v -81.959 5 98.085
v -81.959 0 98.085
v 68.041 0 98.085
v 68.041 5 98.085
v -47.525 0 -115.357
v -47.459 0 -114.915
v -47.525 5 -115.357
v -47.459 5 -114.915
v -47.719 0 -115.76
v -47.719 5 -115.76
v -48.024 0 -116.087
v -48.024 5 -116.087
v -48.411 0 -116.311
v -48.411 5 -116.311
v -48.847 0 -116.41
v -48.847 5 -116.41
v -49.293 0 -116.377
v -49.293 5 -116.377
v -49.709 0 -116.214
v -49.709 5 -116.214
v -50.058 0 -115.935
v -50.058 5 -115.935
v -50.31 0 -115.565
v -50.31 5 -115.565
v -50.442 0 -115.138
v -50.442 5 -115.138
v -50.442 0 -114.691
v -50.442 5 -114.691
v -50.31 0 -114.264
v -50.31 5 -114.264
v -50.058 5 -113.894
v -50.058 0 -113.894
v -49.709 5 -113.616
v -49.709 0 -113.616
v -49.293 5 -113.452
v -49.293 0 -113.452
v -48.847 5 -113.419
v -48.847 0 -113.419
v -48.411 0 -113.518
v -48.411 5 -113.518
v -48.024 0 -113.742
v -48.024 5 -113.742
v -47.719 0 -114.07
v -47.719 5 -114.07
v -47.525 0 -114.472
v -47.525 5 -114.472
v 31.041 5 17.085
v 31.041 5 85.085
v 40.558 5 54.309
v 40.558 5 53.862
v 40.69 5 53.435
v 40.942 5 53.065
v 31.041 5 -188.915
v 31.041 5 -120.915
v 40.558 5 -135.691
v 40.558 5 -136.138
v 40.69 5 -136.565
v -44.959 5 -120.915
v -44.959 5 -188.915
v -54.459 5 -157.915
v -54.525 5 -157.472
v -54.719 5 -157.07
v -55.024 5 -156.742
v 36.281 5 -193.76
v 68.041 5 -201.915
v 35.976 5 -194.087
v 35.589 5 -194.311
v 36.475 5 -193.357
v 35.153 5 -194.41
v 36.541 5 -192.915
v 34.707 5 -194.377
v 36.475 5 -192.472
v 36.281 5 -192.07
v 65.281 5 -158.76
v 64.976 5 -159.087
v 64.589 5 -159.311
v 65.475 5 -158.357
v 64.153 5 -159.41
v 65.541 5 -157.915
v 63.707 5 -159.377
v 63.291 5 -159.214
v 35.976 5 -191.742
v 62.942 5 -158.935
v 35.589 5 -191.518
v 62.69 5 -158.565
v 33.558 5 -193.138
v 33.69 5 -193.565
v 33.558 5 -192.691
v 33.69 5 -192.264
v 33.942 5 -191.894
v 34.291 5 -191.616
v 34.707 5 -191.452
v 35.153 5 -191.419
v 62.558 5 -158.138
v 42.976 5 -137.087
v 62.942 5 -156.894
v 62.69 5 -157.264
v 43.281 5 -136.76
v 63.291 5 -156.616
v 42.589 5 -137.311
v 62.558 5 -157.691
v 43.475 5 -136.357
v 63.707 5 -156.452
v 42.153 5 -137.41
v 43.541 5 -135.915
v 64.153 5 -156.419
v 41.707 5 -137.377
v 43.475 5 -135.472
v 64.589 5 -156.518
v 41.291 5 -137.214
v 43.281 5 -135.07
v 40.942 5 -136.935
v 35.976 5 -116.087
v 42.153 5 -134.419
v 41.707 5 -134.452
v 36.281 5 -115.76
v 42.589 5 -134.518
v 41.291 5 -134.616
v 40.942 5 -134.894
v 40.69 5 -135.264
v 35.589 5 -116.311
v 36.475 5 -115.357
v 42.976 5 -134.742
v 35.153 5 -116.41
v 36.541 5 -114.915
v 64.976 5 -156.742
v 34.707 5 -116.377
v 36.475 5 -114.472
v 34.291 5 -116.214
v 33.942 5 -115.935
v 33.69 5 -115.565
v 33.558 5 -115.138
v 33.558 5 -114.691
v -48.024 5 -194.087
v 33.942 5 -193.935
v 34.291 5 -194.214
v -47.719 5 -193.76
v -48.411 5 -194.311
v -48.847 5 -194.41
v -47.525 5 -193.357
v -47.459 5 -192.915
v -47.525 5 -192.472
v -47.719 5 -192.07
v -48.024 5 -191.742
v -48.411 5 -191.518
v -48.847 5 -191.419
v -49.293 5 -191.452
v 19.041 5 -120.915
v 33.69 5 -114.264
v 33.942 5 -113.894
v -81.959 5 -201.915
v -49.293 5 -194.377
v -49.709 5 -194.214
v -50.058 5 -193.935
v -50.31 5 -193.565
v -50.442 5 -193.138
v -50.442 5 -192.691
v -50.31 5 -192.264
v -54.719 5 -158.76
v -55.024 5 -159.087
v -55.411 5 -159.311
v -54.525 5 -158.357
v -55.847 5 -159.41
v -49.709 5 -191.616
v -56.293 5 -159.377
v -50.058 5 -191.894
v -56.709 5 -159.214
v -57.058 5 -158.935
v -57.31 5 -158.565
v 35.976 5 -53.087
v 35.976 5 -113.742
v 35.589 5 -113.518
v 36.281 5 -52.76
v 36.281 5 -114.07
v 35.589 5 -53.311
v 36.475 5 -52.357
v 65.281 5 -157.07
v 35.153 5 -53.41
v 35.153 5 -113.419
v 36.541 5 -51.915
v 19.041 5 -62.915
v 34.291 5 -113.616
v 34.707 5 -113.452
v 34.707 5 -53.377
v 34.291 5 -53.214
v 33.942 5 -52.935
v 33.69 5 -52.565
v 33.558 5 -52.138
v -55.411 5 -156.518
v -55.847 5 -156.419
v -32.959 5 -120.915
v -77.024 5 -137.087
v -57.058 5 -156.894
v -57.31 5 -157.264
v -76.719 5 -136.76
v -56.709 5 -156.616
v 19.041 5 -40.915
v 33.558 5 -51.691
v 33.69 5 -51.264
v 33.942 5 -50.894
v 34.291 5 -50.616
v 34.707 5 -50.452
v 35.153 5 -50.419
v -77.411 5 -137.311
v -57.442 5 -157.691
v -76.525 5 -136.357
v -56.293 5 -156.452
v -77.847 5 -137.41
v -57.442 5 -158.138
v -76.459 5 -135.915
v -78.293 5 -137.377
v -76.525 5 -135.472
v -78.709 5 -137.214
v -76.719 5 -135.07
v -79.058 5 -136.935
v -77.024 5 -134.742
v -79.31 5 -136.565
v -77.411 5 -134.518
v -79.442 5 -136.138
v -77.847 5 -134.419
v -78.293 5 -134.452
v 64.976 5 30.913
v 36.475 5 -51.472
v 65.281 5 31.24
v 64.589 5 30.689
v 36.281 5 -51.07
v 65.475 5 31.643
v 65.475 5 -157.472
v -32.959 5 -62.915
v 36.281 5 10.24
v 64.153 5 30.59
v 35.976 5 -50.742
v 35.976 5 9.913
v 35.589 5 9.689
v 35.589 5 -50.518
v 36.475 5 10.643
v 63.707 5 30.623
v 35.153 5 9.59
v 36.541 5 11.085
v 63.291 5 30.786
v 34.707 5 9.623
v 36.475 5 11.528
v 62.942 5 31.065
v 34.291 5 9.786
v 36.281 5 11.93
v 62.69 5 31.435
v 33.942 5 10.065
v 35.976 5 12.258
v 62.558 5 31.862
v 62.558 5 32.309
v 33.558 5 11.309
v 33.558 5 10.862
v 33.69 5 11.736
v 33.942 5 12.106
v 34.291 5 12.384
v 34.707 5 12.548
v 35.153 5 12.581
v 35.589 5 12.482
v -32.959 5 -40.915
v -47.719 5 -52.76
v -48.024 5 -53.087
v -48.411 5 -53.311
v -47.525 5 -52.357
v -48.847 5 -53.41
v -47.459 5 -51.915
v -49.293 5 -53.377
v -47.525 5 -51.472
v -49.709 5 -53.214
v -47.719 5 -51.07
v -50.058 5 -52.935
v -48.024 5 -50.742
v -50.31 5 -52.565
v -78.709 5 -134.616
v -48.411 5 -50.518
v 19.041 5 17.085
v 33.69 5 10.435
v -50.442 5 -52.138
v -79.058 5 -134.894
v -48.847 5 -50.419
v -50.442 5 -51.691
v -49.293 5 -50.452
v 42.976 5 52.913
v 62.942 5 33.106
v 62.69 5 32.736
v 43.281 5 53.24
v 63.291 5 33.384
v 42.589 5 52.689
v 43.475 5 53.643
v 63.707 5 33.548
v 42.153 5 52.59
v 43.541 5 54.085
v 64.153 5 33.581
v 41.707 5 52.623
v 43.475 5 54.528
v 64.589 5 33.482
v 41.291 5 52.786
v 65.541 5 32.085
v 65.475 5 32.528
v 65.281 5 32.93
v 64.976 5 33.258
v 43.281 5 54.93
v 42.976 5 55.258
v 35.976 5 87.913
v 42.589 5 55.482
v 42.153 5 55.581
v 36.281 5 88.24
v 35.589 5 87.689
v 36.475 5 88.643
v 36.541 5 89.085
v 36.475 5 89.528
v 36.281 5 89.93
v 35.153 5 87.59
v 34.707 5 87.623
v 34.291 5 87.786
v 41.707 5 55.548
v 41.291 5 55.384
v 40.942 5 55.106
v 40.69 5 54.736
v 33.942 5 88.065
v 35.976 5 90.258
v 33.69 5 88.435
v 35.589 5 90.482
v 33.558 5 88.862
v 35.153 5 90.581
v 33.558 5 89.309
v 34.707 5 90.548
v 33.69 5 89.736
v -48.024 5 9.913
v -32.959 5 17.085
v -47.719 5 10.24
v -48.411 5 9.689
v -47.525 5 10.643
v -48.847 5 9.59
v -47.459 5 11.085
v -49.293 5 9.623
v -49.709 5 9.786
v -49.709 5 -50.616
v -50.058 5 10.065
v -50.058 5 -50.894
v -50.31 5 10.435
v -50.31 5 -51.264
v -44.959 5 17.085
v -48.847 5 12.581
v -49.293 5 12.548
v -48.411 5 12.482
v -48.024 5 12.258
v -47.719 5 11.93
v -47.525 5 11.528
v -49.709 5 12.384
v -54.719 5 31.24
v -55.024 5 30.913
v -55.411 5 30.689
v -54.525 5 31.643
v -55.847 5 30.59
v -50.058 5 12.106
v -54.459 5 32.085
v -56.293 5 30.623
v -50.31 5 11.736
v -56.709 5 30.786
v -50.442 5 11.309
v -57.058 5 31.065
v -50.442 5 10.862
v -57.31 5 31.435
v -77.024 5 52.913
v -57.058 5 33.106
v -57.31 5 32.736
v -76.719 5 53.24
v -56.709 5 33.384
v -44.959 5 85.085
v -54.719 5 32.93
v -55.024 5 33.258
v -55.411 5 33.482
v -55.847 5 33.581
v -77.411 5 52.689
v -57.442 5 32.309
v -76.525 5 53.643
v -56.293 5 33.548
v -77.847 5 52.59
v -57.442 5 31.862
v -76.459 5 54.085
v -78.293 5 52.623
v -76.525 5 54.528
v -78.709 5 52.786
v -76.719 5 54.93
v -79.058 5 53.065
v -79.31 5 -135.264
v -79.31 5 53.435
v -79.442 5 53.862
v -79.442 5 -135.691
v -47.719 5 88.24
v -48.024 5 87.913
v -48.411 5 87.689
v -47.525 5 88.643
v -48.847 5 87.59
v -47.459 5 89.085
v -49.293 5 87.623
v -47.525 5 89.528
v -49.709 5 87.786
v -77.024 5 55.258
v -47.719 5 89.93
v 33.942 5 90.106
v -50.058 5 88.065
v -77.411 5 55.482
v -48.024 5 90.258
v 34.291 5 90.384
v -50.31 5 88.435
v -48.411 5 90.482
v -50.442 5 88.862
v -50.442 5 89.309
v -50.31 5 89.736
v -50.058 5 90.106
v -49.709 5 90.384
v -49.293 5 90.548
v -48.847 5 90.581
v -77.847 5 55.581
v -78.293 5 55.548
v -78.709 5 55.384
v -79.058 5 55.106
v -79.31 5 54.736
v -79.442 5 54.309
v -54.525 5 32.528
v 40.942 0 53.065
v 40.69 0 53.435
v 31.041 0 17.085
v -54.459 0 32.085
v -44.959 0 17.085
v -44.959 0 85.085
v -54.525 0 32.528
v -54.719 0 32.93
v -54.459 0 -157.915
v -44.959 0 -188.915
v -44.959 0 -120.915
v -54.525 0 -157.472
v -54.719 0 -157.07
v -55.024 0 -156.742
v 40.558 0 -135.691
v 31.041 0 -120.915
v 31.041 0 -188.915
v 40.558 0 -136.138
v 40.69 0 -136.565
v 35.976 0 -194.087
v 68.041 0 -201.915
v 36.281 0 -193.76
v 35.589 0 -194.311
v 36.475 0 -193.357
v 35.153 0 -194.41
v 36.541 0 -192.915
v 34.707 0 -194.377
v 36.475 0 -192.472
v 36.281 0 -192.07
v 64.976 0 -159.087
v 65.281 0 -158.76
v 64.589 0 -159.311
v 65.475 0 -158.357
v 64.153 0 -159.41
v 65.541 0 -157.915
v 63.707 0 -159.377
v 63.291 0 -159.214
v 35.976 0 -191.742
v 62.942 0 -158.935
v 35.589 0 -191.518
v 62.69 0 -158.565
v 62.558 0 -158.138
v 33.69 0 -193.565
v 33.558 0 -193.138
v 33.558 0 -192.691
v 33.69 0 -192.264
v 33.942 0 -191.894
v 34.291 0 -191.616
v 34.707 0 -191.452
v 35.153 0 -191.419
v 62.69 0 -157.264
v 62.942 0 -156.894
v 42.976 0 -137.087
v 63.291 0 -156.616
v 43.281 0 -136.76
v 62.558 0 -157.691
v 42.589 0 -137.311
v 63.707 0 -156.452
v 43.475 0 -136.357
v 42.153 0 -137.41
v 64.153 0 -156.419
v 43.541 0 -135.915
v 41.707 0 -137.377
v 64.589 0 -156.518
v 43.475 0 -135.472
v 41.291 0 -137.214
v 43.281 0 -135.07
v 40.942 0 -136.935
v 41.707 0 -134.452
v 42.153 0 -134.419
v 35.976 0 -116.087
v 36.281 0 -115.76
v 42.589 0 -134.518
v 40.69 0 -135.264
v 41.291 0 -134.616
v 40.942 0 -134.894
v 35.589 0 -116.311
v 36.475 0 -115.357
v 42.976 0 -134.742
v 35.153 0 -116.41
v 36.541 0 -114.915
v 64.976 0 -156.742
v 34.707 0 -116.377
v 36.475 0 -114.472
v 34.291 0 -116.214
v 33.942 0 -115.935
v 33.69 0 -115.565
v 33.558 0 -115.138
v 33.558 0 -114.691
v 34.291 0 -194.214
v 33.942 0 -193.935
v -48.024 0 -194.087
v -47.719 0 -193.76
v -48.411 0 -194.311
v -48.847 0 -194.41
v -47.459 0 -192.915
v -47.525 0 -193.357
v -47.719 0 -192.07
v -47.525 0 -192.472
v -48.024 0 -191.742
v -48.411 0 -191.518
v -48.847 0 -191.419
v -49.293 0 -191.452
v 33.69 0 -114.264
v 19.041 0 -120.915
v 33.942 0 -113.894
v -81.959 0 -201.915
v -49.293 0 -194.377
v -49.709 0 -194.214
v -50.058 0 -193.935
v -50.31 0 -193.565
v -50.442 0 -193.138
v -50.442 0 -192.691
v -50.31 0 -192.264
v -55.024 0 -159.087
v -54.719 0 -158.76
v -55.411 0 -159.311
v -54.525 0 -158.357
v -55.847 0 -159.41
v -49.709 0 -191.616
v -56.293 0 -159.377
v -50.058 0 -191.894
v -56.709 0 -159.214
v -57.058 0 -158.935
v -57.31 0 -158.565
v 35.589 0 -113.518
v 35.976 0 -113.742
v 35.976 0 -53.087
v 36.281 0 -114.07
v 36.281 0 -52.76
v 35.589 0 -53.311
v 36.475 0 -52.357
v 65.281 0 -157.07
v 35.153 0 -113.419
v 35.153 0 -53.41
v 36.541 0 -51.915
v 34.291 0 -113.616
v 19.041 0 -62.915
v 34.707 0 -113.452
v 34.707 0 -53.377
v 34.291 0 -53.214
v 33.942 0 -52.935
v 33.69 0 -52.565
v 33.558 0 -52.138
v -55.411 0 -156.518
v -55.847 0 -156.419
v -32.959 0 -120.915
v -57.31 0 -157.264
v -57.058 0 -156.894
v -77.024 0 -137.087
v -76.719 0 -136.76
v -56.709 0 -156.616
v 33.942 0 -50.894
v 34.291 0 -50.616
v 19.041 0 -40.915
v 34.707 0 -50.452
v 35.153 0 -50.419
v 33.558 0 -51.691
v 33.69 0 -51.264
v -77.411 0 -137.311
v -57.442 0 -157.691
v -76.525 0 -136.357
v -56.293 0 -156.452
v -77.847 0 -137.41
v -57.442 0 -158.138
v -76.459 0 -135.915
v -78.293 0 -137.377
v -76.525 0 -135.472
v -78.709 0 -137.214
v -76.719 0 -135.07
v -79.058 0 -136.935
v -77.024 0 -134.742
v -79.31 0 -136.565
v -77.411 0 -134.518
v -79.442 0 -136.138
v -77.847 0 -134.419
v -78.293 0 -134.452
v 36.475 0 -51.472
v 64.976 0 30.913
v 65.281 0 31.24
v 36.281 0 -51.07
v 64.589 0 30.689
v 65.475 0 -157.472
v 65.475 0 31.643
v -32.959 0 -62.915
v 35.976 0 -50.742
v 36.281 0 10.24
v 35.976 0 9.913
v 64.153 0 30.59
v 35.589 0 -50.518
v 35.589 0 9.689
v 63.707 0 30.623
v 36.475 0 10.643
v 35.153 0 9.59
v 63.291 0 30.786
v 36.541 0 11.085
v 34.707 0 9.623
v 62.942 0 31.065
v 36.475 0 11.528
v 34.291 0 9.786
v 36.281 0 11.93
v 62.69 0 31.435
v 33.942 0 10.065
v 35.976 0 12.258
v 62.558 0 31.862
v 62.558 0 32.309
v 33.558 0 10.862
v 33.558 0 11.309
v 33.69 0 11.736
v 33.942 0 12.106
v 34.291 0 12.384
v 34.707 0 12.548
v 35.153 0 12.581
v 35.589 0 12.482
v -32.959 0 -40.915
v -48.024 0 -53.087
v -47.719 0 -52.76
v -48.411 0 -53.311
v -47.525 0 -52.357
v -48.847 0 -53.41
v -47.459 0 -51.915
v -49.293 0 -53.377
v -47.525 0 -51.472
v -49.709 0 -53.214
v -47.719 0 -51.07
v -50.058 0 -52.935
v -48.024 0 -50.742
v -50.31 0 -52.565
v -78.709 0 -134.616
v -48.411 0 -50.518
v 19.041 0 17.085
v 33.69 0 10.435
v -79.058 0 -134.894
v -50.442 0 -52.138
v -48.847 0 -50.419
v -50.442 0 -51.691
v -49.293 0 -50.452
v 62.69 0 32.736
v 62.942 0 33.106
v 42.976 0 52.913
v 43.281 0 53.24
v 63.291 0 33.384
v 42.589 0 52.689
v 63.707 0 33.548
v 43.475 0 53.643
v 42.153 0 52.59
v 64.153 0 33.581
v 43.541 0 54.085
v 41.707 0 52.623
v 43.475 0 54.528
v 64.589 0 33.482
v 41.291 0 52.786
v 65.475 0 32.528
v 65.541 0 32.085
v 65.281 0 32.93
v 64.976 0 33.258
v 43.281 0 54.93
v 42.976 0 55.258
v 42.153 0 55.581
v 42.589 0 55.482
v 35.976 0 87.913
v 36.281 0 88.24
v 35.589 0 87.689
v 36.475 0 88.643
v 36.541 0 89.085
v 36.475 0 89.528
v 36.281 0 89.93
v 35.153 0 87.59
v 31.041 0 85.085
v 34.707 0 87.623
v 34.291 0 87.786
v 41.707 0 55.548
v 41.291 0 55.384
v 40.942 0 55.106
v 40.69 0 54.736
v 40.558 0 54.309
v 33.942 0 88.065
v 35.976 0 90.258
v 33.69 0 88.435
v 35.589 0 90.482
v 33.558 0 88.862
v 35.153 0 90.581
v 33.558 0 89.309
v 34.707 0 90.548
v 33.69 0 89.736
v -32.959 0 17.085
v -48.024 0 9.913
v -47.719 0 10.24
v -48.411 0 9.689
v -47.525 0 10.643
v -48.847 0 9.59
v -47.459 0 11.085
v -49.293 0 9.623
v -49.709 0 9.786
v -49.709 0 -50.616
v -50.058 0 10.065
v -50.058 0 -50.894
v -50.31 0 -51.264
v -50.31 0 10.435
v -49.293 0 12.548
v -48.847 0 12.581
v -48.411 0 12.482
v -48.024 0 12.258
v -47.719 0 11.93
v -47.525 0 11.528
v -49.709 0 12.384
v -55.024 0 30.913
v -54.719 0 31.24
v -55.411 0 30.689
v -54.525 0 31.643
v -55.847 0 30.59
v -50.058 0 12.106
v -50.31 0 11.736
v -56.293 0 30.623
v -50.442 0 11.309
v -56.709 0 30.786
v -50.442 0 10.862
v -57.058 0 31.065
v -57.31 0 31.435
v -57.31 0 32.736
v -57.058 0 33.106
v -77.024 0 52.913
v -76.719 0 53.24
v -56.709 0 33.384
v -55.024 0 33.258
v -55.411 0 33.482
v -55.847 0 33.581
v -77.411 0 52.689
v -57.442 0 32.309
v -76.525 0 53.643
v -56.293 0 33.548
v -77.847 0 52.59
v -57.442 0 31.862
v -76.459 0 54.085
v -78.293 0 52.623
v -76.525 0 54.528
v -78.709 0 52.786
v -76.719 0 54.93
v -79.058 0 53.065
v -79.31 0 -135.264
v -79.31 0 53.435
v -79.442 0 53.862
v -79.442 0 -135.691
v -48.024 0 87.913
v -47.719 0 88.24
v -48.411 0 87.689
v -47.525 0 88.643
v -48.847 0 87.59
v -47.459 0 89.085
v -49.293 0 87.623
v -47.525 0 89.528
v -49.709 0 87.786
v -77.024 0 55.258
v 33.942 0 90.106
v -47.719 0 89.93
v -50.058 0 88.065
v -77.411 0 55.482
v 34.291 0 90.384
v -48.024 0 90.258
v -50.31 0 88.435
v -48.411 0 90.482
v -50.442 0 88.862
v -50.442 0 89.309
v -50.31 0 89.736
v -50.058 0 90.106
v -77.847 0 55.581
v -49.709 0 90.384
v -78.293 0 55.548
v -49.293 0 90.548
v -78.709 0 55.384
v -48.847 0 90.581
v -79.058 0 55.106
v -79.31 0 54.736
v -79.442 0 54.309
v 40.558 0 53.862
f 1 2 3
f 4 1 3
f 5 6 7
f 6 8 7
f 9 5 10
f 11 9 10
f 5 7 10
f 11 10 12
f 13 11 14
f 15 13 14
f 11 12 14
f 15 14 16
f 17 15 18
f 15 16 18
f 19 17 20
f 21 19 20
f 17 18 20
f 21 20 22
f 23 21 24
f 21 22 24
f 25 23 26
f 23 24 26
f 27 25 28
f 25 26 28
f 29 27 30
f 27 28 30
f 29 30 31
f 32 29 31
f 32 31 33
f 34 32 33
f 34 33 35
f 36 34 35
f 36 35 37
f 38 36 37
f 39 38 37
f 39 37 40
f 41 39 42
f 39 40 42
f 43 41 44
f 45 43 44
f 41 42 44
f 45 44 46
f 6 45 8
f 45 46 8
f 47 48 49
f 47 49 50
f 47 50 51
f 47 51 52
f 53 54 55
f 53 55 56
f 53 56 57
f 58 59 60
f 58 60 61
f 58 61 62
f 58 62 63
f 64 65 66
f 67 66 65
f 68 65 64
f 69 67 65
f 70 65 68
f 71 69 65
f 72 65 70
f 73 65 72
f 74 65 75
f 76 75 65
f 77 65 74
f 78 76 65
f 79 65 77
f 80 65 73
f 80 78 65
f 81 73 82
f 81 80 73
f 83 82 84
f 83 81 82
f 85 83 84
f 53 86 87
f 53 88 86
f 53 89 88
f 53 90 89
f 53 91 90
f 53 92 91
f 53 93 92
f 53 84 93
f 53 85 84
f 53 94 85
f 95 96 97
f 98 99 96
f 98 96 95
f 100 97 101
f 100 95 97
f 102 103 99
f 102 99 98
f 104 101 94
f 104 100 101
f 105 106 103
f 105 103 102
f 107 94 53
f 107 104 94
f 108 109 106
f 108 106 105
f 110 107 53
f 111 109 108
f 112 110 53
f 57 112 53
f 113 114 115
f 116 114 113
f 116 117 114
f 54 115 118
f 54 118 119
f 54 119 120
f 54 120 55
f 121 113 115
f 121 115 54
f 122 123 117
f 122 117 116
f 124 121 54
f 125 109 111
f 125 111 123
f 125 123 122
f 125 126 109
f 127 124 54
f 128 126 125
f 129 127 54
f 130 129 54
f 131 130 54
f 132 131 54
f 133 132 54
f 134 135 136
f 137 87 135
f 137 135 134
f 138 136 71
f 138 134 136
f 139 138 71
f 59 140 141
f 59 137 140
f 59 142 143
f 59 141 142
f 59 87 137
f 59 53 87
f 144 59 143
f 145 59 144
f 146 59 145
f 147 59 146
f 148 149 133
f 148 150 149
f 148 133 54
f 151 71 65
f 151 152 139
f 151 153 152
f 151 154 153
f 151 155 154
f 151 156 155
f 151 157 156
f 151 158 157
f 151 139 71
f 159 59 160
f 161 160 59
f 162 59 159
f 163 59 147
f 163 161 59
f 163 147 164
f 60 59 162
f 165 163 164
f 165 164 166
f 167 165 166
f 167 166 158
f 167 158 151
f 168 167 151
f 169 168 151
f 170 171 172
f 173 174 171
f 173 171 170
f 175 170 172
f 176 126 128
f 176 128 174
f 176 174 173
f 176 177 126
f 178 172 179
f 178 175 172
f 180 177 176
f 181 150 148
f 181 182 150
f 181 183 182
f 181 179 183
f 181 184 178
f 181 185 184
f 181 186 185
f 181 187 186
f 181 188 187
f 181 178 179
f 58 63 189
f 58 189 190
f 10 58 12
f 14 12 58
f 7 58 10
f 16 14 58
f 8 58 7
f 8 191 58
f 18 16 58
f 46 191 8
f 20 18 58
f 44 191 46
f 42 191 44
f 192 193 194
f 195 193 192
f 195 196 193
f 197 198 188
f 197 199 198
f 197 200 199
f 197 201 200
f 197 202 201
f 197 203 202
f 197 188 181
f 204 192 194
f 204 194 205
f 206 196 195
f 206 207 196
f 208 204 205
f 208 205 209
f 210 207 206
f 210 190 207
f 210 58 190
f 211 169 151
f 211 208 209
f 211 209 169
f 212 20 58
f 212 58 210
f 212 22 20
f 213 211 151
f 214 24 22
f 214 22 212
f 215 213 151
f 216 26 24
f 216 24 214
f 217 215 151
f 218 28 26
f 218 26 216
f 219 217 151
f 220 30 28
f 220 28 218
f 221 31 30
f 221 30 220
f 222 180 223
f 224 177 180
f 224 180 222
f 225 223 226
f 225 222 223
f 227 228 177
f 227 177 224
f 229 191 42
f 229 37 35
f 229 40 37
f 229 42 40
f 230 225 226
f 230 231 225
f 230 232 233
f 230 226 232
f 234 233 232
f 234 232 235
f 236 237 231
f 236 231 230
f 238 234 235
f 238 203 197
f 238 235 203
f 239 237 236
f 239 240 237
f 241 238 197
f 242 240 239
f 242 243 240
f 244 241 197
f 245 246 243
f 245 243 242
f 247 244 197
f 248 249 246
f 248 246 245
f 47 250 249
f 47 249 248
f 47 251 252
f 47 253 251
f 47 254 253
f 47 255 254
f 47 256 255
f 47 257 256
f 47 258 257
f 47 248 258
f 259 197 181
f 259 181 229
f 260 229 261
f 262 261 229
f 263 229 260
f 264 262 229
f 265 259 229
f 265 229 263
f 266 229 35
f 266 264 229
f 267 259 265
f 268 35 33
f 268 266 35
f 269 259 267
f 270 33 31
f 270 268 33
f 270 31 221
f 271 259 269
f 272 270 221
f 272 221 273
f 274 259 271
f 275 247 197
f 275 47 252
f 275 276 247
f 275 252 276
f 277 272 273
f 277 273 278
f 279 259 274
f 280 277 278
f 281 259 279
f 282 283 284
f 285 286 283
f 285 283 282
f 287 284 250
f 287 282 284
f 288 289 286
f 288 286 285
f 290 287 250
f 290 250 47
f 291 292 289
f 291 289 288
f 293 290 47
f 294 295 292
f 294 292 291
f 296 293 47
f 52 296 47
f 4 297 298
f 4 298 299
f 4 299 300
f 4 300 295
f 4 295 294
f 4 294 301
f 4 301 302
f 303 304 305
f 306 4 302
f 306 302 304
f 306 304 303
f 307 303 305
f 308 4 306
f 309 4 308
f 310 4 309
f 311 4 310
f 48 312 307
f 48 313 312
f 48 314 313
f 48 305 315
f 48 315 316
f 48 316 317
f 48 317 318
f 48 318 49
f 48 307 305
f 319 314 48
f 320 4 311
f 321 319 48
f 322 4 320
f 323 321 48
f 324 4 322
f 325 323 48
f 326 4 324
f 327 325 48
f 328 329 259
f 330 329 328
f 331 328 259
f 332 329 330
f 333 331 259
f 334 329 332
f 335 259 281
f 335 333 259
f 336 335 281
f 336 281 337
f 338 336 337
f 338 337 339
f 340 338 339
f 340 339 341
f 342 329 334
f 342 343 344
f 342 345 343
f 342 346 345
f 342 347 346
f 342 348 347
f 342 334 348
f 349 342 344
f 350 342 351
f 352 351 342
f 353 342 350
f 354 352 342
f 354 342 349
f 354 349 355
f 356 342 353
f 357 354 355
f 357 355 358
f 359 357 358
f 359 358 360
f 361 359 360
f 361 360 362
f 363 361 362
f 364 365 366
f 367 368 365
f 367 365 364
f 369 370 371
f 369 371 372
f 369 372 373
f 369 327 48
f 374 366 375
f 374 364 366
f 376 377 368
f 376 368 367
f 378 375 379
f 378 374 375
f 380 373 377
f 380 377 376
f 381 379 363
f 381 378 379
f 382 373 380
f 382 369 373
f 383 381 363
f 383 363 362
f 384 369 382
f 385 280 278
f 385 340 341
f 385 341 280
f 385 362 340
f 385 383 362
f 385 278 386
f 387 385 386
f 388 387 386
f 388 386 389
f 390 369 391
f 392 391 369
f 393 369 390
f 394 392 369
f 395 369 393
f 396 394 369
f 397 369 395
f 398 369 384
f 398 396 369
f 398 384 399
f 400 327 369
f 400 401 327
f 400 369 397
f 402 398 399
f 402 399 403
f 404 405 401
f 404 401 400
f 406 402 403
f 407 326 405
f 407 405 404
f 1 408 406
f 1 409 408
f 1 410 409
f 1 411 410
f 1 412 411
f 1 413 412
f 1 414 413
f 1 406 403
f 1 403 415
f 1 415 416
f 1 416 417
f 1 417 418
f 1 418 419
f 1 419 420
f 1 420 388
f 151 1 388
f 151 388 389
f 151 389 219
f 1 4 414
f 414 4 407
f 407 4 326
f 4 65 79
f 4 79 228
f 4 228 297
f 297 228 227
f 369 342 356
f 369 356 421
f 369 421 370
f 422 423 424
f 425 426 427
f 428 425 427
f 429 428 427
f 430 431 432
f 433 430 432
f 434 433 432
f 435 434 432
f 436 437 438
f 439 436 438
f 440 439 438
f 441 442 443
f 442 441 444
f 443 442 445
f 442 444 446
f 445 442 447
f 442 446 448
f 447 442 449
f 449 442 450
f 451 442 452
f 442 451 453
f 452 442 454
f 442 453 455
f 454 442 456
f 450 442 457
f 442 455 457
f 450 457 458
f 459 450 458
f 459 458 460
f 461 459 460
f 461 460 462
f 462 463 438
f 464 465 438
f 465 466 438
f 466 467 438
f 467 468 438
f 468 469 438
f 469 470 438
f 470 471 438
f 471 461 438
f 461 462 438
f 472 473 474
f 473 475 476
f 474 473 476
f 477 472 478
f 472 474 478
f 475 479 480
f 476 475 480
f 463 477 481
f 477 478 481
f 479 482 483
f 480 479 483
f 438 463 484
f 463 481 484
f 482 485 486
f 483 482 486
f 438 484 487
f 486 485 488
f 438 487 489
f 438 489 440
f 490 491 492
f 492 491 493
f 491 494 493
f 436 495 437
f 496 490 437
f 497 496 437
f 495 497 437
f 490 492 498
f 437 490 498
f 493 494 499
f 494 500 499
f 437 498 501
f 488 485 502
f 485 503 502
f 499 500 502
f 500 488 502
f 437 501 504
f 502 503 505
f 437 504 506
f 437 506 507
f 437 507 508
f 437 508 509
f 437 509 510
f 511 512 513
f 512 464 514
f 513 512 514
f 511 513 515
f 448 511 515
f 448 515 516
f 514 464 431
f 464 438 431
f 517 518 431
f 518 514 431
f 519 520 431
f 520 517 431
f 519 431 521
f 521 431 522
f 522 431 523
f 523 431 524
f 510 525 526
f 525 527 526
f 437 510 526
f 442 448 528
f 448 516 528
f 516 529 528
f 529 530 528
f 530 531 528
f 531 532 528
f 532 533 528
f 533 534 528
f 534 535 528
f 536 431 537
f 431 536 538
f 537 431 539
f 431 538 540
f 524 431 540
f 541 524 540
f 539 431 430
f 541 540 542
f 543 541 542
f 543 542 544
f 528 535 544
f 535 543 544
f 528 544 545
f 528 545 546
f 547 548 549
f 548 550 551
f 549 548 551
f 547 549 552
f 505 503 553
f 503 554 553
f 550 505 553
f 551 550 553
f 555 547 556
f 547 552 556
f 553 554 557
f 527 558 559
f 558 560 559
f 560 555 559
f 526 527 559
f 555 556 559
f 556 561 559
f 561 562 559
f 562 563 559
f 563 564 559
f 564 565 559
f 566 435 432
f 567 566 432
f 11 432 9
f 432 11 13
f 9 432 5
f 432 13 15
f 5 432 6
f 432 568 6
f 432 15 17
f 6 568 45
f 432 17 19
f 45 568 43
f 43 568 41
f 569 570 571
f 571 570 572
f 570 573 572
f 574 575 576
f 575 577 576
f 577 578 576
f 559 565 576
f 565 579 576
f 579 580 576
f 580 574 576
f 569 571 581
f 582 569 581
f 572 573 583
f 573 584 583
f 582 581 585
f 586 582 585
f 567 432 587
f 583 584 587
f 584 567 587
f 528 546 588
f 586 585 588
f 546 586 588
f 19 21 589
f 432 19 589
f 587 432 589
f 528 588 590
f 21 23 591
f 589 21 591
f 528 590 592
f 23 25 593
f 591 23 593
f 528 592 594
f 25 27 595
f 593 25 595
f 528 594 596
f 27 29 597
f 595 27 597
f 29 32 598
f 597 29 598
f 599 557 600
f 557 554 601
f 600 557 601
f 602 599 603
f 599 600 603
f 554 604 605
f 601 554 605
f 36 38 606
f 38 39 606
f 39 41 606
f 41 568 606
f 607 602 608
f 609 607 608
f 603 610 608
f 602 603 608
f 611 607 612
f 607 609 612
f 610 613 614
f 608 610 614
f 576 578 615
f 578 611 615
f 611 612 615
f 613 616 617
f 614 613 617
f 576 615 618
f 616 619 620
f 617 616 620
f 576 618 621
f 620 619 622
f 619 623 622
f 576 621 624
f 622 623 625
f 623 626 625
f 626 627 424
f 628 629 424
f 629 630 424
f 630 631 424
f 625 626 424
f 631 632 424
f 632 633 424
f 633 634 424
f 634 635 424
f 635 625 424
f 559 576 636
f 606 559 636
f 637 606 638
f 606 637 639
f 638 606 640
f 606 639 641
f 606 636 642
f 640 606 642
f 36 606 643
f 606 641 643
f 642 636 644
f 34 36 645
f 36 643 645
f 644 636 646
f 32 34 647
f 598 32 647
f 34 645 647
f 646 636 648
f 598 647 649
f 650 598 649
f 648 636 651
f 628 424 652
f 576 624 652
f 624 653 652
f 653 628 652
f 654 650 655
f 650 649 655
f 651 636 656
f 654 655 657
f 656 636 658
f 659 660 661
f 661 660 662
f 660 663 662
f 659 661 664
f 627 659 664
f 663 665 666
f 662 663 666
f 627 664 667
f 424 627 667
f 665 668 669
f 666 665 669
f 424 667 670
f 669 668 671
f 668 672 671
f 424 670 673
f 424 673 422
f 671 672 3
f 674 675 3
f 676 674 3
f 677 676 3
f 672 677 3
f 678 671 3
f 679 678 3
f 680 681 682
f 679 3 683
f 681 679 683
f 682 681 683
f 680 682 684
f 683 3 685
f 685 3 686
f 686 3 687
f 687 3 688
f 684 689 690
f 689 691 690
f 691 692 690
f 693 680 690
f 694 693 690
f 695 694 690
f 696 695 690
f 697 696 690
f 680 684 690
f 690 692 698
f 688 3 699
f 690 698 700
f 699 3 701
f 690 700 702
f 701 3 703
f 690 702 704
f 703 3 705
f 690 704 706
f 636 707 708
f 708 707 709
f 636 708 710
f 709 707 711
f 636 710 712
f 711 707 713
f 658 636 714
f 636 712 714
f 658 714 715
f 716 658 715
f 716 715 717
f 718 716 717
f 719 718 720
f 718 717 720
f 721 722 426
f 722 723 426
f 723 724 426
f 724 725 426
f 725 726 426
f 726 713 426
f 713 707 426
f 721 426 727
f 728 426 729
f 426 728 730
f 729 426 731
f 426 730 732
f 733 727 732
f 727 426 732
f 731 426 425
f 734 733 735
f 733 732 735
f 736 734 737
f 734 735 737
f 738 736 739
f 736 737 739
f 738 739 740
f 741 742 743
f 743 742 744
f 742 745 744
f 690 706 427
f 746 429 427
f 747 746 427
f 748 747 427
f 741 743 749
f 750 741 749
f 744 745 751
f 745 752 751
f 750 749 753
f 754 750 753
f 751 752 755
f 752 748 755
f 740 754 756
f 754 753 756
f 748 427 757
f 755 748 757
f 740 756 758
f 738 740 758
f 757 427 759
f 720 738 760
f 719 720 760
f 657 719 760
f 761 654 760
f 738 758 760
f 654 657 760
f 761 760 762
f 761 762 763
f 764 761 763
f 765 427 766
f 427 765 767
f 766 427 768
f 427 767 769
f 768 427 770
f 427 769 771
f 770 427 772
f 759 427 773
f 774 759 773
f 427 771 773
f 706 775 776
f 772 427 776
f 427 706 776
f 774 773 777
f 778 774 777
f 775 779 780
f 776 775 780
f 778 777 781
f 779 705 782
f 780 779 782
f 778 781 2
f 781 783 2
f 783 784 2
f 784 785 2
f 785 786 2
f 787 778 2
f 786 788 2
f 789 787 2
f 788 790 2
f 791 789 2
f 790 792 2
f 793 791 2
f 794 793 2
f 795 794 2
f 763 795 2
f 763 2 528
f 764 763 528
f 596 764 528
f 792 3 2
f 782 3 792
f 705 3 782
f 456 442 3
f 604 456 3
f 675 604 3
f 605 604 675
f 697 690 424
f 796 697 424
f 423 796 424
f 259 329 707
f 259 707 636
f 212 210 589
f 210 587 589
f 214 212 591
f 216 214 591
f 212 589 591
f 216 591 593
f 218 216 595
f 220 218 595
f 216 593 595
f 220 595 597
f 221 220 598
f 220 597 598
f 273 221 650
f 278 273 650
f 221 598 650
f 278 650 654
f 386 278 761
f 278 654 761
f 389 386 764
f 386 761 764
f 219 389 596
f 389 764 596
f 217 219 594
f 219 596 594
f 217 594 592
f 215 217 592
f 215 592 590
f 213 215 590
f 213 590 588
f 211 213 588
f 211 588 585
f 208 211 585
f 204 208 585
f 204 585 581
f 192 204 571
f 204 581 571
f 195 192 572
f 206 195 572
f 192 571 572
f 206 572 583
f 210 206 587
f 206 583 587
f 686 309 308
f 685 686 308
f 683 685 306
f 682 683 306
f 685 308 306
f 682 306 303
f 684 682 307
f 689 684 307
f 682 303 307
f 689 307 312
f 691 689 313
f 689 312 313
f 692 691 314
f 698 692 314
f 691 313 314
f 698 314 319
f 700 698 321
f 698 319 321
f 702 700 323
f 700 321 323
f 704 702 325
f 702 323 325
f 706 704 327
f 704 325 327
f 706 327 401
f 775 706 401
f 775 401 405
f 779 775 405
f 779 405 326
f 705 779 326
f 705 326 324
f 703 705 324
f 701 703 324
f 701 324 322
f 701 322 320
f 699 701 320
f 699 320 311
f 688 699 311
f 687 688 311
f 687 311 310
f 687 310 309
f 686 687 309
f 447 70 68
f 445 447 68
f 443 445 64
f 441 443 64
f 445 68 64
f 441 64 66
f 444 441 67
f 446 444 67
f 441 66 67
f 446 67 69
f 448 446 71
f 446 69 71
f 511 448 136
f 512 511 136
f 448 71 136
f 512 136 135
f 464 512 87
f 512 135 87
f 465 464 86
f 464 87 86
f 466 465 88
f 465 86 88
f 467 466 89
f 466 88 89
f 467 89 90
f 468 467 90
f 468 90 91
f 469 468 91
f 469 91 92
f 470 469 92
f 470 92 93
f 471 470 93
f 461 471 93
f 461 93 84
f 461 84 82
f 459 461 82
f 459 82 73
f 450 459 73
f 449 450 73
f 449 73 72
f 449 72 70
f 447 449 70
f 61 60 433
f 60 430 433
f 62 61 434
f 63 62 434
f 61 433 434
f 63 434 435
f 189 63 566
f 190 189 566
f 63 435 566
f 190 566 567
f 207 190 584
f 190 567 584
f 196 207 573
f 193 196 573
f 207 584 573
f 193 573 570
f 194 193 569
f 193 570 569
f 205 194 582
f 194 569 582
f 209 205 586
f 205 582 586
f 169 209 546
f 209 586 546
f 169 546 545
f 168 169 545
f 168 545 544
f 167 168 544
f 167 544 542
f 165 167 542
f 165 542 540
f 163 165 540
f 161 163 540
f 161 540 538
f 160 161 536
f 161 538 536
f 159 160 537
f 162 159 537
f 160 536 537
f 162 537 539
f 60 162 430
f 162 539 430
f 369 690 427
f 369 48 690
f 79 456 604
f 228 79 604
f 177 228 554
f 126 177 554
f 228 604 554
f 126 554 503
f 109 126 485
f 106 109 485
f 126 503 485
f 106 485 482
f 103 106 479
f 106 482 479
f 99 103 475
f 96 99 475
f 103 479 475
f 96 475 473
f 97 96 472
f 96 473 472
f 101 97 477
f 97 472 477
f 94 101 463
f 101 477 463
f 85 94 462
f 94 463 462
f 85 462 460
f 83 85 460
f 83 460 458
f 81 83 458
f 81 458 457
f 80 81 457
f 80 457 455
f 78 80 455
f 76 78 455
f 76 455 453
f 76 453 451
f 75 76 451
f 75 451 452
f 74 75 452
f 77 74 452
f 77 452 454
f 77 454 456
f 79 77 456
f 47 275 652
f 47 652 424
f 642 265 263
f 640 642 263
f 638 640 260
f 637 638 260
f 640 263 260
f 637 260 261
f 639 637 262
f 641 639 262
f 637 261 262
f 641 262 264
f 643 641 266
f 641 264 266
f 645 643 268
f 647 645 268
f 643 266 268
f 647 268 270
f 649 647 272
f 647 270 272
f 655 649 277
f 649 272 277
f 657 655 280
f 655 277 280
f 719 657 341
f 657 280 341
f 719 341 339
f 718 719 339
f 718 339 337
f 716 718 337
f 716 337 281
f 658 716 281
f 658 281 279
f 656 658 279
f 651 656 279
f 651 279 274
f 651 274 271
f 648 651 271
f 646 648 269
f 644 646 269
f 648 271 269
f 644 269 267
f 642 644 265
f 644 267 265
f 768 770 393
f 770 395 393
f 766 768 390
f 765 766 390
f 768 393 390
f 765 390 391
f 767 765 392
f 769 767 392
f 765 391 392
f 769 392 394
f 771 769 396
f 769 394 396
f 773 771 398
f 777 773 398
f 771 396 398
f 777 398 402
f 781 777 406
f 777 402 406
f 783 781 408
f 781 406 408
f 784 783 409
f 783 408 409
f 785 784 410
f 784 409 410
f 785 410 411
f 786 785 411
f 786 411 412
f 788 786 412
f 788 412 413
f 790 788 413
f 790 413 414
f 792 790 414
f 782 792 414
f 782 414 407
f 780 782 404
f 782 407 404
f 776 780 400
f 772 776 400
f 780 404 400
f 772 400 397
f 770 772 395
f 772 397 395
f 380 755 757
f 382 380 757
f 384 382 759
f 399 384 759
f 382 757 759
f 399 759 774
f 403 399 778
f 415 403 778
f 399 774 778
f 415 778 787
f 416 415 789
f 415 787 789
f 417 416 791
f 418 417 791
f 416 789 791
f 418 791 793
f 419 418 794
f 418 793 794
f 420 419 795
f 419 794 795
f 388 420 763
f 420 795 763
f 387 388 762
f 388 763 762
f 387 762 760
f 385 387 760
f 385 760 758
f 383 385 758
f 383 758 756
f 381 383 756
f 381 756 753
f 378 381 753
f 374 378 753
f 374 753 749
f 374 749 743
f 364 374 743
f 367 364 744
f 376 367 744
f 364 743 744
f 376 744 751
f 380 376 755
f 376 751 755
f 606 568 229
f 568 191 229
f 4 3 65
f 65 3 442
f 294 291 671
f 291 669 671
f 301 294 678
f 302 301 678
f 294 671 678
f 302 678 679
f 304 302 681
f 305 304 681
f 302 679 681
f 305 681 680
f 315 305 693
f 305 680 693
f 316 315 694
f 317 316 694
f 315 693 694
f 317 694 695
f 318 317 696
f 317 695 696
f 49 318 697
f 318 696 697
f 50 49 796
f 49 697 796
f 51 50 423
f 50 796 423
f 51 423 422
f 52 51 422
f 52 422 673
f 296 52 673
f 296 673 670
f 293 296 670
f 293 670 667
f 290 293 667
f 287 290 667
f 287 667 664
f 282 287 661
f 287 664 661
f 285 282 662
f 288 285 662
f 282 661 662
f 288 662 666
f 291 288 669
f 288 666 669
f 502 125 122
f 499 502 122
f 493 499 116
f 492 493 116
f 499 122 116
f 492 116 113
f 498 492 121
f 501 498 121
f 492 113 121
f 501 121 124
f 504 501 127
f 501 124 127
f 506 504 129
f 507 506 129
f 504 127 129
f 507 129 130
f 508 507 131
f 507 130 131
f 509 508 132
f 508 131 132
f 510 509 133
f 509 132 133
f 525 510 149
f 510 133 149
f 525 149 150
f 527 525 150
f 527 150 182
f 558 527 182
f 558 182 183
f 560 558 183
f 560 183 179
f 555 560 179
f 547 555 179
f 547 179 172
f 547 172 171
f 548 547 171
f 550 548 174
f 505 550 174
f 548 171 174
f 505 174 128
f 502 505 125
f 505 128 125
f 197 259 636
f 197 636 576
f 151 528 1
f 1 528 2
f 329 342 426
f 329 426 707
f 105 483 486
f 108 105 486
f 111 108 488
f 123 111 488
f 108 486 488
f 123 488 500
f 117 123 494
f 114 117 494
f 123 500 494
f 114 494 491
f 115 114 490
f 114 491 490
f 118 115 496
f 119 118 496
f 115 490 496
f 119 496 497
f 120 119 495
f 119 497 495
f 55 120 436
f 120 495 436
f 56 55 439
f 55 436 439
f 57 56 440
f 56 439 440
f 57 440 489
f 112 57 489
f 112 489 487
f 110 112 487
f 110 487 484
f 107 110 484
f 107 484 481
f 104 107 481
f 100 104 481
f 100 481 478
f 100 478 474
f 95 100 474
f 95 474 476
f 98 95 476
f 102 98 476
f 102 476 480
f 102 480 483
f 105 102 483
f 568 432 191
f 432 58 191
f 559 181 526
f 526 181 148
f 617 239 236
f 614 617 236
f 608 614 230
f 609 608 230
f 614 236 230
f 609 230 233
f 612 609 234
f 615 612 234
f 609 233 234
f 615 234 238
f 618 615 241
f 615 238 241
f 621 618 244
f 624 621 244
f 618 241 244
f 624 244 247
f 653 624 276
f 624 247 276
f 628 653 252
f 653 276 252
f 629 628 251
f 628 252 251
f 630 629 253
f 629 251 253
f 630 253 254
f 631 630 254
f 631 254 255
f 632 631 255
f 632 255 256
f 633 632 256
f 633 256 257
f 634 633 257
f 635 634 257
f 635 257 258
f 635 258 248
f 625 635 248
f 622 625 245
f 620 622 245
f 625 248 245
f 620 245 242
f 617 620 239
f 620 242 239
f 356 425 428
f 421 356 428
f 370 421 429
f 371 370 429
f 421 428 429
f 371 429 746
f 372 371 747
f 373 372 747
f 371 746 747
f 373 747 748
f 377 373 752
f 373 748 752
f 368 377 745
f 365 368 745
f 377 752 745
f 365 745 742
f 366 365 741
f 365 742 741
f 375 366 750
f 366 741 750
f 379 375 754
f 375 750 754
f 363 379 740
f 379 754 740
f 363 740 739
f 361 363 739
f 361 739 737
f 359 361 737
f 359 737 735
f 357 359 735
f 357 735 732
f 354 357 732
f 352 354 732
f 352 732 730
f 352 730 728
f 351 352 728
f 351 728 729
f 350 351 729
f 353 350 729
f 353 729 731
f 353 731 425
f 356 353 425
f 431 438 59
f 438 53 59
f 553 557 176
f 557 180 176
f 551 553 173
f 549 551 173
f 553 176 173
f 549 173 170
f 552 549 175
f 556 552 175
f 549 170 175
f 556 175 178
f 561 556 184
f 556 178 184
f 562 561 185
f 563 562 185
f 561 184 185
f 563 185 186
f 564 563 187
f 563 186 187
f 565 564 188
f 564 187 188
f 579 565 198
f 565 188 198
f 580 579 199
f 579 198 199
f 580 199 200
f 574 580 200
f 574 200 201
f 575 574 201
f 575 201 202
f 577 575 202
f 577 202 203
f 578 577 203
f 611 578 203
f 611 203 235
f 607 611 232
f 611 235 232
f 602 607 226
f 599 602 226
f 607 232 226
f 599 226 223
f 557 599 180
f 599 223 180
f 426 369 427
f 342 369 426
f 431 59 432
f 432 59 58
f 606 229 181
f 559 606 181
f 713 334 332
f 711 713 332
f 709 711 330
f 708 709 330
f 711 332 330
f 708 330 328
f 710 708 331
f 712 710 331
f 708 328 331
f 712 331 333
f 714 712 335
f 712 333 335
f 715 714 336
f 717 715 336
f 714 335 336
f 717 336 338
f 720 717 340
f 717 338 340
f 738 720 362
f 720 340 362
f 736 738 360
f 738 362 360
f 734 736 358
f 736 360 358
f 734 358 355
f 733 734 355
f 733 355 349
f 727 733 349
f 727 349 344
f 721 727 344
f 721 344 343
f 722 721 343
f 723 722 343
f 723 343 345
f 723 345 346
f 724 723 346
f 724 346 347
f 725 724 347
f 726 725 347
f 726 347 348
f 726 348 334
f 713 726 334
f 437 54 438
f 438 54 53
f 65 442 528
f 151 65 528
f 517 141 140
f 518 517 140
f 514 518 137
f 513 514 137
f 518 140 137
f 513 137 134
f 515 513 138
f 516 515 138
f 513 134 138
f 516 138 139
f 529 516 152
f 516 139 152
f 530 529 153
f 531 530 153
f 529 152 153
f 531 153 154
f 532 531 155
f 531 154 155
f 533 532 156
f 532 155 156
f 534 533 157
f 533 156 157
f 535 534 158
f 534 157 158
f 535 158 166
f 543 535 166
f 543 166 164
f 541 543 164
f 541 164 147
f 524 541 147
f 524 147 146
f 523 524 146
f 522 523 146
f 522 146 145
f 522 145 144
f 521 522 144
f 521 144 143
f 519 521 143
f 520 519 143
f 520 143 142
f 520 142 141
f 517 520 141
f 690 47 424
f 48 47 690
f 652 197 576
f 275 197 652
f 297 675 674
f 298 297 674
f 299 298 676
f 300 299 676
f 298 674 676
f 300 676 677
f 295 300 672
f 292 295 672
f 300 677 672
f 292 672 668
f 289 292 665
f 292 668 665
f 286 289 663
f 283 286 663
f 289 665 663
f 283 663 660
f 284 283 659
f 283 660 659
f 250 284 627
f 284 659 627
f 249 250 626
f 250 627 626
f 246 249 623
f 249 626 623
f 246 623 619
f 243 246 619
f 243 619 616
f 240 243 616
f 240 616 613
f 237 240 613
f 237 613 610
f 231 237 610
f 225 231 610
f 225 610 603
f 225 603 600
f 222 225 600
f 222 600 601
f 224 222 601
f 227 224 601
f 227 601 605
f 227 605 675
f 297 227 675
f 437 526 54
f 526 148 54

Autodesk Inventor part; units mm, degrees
ref_plane "YZ Plane" through (0, 0, 0) normal (1, 0, 0) x (0, 1, 0)
ref_plane "XZ Plane" through (0, 0, 0) normal (0, 1, 0) x (-1, 0, 0)
ref_plane "XY Plane" through (0, 0, 0) normal (0, 0, 1) x (1, 0, 0)
sketch "Esquisse1" plane through (0, 0, 0) normal (0, 1, 0) x (-1, 0, 0)
  line L0 (81.9588, 98.0854) -> (-68.0412, 98.0854)
  line L1 (-68.0412, 98.0854) -> (-68.0412, -201.9146)
  line L2 (-68.0412, -201.9146) -> (81.9588, -201.9146)
  line L3 (81.9588, -201.9146) -> (81.9588, 98.0854)
  point P0 (0, 0)
  dimension "d0" = 300
  dimension "d1" = 150
extrude "Extrusion1" add sketch "Esquisse1" along normal blind 5
sketch "Sketch3" plane through (0, 5, 0) normal (0, 1, 0) x (1, 0, 0)
  line L0 (31.0412, -85.0854) -> (-44.9588, -85.0854)
  line L1 (-44.9588, -85.0854) -> (-44.9588, -17.0854)
  line L2 (31.0412, -17.0854) -> (31.0412, -85.0854)
  line L3 (-81.9588, -98.0854) -> (68.0412, -98.0854) projected
  line L4 (68.0412, -98.0854) -> (68.0412, 201.9146) projected
  line L5 (-32.9588, -17.0854) -> (-32.9588, 40.9146)
  line L6 (-32.9588, 40.9146) -> (19.0412, 40.9146)
  line L7 (19.0412, 40.9146) -> (19.0412, -17.0854)
  line L8 (-44.9588, -17.0854) -> (-32.9588, -17.0854)
  line L9 (19.0412, -17.0854) -> (31.0412, -17.0854)
  line L10 (31.0412, 188.9146) -> (-44.9588, 188.9146)
  line L11 (-44.9588, 188.9146) -> (-44.9588, 120.9146)
  line L12 (31.0412, 120.9146) -> (31.0412, 188.9146)
  line L13 (68.0412, 201.9146) -> (-81.9588, 201.9146) projected
  line L14 (-32.9588, 120.9146) -> (-32.9588, 62.9146)
  line L15 (-32.9588, 62.9146) -> (19.0412, 62.9146)
  line L16 (19.0412, 62.9146) -> (19.0412, 120.9146)
  line L17 (-44.9588, 120.9146) -> (-32.9588, 120.9146)
  line L18 (19.0412, 120.9146) -> (31.0412, 120.9146)
  circle A0 centre (35.0412, 51.9146) radius 1.5
  line L19 (-81.9588, 201.9146) -> (-81.9588, -98.0854) projected
  circle A1 centre (-48.9588, 51.9146) radius 1.5
  point P0 (0, 0)
  dimension "d17" = 76
  dimension "d18" = 68
  dimension "d19" = 13
  dimension "d20" = 37
  dimension "d21" = 12
  dimension "d22" = 12
  dimension "d23" = 58
  dimension "d24" = 68
  dimension "d25" = 52
  dimension "d26" = 13
  dimension "d27" = 76
  dimension "d28" = 68
  dimension "d29" = 37
  dimension "d30" = 12
  dimension "d31" = 12
  dimension "d32" = 58
  dimension "d33" = 52
  dimension "d34" = 68
  dimension "d39" = 3
  dimension "d53" = 33
  dimension "d54" = 150
  dimension "d58" = 3
  dimension "d59" = 33
  dimension "d60" = 150
extrude "Extrusion3" cut sketch "Sketch3" against normal through all contours L0 L1 L8 L5 L6 L7 L9 L2 | L12 L18 L16 L15 L14 L17 L11 L10 | A0 | A1
sketch "Esquisse10" plane through (0, 5, 0) normal (0, 1, 0) x (1, 0, 0)
  circle A0 centre (-48.9588, -89.0854) radius 1.5
  circle A1 centre (-48.9588, -11.0854) radius 1.5
  circle A2 centre (-48.9588, 114.9146) radius 1.5
  circle A3 centre (-48.9588, 192.9146) radius 1.5
  circle A4 centre (35.0412, 192.9146) radius 1.5
  circle A5 centre (35.0412, 114.9146) radius 1.5
  circle A6 centre (35.0412, -11.0854) radius 1.5
  circle A7 centre (35.0412, -89.0854) radius 1.5
  point P0 (0, 0)
extrude "Extrusion9" cut sketch "Esquisse10" against normal through all
sketch "Esquisse12" plane through (0, 0, 0) normal (0, -1, 0) x (1, 0, 0)
  circle A0 centre (-77.9588, 54.0854) radius 1.5
  circle A1 centre (-55.9588, 32.0854) radius 1.5
  circle A2 centre (42.0412, 54.0854) radius 1.5
  circle A3 centre (64.0412, 32.0854) radius 1.5
  circle A4 centre (42.0412, -135.9146) radius 1.5
  circle A5 centre (64.0412, -157.9146) radius 1.5
  circle A6 centre (-55.9588, -157.9146) radius 1.5
  circle A7 centre (-77.9588, -135.9146) radius 1.5
  point P0 (0, 0)
extrude "Extrusion10" cut sketch "Esquisse12" against normal through all
properties part number "socle-robot"
